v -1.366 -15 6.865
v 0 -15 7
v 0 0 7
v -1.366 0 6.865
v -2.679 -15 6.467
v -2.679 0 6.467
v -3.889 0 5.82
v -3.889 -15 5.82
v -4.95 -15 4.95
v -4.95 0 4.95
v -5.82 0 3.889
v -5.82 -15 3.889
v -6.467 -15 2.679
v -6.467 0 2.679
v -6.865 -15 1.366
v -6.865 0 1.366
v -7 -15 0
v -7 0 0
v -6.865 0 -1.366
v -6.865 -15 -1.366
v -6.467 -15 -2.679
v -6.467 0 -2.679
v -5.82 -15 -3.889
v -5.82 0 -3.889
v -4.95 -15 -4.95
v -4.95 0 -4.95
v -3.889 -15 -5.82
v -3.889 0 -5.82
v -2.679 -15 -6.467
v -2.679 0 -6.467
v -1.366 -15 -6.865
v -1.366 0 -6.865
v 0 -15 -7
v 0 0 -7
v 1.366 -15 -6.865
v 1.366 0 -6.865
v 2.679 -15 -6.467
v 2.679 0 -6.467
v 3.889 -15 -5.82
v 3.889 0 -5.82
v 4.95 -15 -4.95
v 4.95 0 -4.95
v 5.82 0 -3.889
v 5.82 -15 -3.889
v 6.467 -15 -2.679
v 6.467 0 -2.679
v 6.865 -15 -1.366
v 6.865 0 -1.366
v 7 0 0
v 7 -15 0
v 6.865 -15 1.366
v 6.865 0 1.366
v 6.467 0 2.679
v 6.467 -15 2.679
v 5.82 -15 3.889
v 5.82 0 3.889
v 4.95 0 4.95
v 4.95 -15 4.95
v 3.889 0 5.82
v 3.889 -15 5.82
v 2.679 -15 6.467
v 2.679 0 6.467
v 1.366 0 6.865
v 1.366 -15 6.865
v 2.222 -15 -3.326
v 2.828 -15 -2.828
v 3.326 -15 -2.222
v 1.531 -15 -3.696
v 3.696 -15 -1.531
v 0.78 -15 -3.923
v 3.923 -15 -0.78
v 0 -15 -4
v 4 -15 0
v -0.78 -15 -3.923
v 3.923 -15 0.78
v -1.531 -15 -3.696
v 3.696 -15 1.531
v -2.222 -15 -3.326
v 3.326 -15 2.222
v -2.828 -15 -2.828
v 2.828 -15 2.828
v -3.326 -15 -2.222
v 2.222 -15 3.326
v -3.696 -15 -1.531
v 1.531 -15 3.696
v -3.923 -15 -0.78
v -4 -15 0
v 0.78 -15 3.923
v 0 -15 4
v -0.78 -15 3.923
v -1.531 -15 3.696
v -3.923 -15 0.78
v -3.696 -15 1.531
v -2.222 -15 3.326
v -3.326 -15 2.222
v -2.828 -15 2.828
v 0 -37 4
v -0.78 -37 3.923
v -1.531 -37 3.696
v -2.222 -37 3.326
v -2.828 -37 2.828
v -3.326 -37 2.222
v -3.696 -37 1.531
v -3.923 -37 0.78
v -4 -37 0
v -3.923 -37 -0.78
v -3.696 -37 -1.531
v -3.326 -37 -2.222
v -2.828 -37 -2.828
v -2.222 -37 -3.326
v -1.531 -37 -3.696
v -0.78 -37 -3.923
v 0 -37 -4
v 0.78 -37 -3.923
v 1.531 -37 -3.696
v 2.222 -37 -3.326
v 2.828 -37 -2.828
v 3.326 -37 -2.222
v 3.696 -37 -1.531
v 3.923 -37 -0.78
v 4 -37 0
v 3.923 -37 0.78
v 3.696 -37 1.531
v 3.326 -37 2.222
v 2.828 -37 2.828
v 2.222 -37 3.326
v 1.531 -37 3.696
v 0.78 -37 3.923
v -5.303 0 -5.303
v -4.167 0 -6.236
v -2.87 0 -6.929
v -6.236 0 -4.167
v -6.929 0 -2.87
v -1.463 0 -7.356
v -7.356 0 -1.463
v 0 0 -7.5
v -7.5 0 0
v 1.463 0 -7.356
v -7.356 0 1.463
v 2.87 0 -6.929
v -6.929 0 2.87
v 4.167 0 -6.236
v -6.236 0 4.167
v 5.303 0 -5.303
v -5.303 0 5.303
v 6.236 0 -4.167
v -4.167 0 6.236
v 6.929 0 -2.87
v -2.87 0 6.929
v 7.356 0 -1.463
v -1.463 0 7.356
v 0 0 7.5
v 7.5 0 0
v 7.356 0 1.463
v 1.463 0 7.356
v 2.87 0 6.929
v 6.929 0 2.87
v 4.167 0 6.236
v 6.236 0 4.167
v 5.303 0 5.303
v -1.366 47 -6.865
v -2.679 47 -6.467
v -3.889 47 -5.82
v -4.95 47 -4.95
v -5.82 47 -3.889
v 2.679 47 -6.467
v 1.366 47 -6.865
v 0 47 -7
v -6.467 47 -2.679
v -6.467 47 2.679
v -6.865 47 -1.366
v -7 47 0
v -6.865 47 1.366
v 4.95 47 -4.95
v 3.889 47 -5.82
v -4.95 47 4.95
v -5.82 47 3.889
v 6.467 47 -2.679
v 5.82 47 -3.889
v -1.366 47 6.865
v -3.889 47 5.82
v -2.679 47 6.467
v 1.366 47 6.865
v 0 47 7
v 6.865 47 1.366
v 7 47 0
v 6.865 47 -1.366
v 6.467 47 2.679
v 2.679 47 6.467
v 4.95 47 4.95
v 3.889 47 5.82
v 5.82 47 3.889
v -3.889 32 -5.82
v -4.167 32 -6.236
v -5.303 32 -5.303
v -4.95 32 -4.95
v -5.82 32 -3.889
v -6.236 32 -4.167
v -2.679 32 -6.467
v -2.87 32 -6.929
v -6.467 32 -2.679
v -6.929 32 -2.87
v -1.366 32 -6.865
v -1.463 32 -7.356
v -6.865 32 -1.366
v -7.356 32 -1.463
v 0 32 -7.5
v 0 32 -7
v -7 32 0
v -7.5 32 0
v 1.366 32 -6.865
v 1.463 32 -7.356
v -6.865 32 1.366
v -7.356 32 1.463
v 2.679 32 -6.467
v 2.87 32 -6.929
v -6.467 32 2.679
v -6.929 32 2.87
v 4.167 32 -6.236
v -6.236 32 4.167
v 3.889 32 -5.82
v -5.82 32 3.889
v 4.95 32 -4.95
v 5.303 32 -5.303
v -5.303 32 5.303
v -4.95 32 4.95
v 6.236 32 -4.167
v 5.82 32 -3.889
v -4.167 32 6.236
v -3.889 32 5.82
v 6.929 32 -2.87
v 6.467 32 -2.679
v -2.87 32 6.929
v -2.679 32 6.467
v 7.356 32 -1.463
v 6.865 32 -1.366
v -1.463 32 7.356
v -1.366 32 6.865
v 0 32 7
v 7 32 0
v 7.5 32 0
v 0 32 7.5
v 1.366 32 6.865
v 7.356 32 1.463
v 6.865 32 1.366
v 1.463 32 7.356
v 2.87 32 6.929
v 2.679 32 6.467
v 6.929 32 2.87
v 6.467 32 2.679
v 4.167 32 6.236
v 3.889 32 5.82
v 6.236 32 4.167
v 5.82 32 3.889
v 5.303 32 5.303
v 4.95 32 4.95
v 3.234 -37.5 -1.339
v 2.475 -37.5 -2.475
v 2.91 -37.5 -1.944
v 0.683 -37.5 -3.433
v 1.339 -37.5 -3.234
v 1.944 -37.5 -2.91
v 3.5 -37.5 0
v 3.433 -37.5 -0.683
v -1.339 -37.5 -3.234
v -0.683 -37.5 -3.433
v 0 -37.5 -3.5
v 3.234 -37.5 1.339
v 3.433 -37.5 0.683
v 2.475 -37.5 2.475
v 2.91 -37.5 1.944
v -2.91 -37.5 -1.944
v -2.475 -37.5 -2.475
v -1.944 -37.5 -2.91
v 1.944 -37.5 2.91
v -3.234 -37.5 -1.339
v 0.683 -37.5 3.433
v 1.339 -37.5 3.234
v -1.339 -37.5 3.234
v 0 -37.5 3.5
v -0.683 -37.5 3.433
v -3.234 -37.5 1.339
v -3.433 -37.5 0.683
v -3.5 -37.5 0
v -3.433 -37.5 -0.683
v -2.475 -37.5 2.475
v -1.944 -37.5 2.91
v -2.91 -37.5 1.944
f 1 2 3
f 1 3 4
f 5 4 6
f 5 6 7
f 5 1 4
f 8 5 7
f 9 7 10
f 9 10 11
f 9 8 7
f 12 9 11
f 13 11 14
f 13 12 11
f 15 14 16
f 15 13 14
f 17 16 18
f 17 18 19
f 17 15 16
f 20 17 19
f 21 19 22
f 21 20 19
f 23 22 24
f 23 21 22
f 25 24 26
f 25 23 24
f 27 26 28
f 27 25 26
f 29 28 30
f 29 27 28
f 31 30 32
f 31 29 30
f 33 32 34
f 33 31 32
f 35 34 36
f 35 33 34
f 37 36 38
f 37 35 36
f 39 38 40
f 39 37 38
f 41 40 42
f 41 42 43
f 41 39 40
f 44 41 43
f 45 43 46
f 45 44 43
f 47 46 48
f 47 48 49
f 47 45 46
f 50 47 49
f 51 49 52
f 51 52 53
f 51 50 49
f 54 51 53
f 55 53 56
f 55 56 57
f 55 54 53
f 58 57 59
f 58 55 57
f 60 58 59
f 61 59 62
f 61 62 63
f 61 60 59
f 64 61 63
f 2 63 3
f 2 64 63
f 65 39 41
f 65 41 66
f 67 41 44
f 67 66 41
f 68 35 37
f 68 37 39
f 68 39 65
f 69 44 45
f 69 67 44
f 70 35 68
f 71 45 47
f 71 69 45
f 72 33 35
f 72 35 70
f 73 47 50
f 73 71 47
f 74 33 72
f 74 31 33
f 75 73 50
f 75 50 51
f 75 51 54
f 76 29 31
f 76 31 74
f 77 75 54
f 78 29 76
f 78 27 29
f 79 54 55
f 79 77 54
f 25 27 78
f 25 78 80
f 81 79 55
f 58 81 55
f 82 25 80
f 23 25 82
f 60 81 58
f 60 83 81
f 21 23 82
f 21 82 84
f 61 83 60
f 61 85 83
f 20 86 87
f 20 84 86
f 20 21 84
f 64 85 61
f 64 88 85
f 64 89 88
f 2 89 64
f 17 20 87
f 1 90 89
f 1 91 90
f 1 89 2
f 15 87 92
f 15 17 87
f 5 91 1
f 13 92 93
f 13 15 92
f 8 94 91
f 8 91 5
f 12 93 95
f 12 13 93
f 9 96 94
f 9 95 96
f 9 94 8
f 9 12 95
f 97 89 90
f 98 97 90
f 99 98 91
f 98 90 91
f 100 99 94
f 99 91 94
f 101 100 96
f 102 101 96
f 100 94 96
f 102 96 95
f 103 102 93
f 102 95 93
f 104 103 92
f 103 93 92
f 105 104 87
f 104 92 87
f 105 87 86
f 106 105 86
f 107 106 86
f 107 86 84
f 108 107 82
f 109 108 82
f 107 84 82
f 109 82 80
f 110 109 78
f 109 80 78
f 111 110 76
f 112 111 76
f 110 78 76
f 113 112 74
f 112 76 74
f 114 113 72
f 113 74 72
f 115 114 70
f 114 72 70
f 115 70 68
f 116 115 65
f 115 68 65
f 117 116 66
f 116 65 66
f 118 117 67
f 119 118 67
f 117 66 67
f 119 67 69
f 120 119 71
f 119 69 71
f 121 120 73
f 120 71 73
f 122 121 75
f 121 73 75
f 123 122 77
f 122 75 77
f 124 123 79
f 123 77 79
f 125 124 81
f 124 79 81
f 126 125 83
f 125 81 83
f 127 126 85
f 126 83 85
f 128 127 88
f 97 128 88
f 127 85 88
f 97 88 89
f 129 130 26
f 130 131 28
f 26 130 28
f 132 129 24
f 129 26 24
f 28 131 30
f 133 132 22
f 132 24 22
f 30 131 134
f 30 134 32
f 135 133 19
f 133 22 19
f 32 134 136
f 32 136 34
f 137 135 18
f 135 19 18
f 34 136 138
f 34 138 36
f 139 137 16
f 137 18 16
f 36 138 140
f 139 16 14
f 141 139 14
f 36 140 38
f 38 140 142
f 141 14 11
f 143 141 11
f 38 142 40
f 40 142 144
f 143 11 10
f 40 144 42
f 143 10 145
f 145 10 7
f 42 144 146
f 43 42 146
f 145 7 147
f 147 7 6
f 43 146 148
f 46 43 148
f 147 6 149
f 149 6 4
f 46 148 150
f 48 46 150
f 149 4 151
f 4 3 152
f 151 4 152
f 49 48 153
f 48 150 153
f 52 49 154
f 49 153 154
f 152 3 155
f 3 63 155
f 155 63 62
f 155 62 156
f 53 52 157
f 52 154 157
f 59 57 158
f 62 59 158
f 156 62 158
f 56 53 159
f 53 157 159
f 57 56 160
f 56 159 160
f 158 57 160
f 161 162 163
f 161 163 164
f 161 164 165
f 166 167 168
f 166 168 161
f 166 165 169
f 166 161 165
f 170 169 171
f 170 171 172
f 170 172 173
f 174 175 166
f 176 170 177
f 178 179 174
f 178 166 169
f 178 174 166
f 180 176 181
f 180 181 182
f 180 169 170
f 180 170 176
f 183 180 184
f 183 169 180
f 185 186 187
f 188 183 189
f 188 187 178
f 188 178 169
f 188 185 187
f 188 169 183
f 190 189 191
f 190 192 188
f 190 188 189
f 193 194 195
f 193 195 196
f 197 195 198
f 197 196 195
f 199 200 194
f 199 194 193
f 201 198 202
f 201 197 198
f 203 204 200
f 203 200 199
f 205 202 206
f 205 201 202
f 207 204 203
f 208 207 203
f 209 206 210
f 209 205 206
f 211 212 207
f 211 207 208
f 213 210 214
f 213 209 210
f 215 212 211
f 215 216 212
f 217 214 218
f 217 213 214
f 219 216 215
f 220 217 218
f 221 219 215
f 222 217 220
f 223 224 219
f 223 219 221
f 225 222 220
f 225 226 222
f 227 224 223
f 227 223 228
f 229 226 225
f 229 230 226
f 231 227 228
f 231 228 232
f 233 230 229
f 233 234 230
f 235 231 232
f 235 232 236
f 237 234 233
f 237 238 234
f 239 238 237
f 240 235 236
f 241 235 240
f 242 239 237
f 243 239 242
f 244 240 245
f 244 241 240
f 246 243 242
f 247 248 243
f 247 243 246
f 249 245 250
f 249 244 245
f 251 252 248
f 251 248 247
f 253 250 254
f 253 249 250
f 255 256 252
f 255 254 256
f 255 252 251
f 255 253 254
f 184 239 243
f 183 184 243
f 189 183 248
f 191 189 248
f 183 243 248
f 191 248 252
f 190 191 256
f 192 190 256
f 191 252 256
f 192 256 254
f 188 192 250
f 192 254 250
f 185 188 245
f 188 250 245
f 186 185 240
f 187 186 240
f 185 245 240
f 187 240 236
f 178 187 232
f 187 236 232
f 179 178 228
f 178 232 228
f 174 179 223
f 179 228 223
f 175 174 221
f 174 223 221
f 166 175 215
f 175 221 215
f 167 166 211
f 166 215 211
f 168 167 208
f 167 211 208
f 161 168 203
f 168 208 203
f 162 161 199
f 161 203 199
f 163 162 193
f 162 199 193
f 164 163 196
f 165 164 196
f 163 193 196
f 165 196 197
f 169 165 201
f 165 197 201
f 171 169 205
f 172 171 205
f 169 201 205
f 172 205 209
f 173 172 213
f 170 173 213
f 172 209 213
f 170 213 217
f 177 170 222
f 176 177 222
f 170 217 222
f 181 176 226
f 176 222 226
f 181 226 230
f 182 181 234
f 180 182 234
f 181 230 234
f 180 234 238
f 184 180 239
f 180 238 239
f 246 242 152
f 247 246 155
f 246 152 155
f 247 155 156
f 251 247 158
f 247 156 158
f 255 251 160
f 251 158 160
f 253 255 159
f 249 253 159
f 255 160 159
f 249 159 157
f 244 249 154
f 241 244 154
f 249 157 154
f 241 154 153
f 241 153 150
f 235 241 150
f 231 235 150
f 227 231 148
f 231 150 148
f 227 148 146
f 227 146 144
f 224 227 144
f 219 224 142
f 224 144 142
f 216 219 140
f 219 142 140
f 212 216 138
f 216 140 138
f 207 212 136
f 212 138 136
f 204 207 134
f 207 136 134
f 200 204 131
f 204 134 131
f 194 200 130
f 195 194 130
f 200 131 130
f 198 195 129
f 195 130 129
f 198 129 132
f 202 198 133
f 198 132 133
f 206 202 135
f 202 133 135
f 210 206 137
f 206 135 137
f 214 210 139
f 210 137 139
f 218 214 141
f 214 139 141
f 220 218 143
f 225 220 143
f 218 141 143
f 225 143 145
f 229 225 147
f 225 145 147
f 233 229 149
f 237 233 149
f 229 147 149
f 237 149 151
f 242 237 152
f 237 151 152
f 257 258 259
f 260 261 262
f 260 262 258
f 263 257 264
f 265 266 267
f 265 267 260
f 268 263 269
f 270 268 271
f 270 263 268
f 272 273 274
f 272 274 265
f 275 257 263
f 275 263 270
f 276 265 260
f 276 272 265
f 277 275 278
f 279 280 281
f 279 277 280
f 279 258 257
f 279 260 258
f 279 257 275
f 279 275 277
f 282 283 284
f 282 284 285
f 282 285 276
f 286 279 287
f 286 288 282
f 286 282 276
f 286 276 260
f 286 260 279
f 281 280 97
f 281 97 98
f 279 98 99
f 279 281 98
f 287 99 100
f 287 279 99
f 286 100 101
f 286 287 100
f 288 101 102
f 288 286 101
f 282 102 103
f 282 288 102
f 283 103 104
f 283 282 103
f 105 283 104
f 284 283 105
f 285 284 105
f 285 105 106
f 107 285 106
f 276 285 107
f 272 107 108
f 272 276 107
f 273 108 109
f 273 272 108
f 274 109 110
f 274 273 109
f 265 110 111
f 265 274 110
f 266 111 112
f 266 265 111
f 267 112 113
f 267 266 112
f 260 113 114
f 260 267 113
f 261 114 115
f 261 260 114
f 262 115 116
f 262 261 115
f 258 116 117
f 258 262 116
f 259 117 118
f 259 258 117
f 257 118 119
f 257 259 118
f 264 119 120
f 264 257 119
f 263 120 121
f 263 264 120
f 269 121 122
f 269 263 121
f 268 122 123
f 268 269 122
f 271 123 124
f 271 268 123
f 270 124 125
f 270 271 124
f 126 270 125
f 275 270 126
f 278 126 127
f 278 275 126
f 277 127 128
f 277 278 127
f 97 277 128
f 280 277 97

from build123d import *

# Parameters (mm, degrees)
SKETCH1_R           = 7.5
BOSS_EXTRUDE1_DEPTH = 32
SKETCH2_R           = 7
BOSS_EXTRUDE2_DEPTH = 15
BOSS_EXTRUDE3_START = 15
SKETCH3_R           = 7
BOSS_EXTRUDE3_DEPTH = 15
SKETCH4_R           = 4
BOSS_EXTRUDE4_DEPTH = 22.5
CHAMFER1_SIZE       = 0.5


with BuildPart() as part:
    # Sketch1 → Boss-Extrude1 (new body)
    with BuildSketch(Plane(origin=(0, 0, 0), x_dir=(1, 0, 0), z_dir=(0, 1, 0))):
        with Locations(Location((0, 0, 0), (0, 0, 270))):
            Circle(SKETCH1_R)
    extrude(amount=BOSS_EXTRUDE1_DEPTH)

    # Sketch2 → Boss-Extrude2 (add)
    with BuildSketch(Plane(origin=(0, 32, 0), x_dir=(1, 0, 0), z_dir=(0, 1, 0))):
        with Locations(Location((0, 0, 0), (0, 0, 270))):
            Circle(SKETCH2_R)
    extrude(amount=BOSS_EXTRUDE2_DEPTH)

    # Sketch3 → Boss-Extrude3 (add)
    with BuildSketch(Plane.XZ.offset(BOSS_EXTRUDE3_START)):
        with Locations(Location((0, 0, 0), (0, 0, 90))):
            Circle(SKETCH3_R)
    extrude(amount=-BOSS_EXTRUDE3_DEPTH)

    # Sketch4 → Boss-Extrude4 (add)
    with BuildSketch(Plane.XZ.offset(15)):
        with Locations(Location((0, 0, 0), (0, 0, 90))):
            Circle(SKETCH4_R)
    extrude(amount=BOSS_EXTRUDE4_DEPTH)

    # Chamfer1
    chamfer1_edges = [part.edges().sort_by_distance(p)[0] for p in [
        (0, -37.5, -4),
    ]]
    chamfer(chamfer1_edges, length=CHAMFER1_SIZE)


solid = part.part
